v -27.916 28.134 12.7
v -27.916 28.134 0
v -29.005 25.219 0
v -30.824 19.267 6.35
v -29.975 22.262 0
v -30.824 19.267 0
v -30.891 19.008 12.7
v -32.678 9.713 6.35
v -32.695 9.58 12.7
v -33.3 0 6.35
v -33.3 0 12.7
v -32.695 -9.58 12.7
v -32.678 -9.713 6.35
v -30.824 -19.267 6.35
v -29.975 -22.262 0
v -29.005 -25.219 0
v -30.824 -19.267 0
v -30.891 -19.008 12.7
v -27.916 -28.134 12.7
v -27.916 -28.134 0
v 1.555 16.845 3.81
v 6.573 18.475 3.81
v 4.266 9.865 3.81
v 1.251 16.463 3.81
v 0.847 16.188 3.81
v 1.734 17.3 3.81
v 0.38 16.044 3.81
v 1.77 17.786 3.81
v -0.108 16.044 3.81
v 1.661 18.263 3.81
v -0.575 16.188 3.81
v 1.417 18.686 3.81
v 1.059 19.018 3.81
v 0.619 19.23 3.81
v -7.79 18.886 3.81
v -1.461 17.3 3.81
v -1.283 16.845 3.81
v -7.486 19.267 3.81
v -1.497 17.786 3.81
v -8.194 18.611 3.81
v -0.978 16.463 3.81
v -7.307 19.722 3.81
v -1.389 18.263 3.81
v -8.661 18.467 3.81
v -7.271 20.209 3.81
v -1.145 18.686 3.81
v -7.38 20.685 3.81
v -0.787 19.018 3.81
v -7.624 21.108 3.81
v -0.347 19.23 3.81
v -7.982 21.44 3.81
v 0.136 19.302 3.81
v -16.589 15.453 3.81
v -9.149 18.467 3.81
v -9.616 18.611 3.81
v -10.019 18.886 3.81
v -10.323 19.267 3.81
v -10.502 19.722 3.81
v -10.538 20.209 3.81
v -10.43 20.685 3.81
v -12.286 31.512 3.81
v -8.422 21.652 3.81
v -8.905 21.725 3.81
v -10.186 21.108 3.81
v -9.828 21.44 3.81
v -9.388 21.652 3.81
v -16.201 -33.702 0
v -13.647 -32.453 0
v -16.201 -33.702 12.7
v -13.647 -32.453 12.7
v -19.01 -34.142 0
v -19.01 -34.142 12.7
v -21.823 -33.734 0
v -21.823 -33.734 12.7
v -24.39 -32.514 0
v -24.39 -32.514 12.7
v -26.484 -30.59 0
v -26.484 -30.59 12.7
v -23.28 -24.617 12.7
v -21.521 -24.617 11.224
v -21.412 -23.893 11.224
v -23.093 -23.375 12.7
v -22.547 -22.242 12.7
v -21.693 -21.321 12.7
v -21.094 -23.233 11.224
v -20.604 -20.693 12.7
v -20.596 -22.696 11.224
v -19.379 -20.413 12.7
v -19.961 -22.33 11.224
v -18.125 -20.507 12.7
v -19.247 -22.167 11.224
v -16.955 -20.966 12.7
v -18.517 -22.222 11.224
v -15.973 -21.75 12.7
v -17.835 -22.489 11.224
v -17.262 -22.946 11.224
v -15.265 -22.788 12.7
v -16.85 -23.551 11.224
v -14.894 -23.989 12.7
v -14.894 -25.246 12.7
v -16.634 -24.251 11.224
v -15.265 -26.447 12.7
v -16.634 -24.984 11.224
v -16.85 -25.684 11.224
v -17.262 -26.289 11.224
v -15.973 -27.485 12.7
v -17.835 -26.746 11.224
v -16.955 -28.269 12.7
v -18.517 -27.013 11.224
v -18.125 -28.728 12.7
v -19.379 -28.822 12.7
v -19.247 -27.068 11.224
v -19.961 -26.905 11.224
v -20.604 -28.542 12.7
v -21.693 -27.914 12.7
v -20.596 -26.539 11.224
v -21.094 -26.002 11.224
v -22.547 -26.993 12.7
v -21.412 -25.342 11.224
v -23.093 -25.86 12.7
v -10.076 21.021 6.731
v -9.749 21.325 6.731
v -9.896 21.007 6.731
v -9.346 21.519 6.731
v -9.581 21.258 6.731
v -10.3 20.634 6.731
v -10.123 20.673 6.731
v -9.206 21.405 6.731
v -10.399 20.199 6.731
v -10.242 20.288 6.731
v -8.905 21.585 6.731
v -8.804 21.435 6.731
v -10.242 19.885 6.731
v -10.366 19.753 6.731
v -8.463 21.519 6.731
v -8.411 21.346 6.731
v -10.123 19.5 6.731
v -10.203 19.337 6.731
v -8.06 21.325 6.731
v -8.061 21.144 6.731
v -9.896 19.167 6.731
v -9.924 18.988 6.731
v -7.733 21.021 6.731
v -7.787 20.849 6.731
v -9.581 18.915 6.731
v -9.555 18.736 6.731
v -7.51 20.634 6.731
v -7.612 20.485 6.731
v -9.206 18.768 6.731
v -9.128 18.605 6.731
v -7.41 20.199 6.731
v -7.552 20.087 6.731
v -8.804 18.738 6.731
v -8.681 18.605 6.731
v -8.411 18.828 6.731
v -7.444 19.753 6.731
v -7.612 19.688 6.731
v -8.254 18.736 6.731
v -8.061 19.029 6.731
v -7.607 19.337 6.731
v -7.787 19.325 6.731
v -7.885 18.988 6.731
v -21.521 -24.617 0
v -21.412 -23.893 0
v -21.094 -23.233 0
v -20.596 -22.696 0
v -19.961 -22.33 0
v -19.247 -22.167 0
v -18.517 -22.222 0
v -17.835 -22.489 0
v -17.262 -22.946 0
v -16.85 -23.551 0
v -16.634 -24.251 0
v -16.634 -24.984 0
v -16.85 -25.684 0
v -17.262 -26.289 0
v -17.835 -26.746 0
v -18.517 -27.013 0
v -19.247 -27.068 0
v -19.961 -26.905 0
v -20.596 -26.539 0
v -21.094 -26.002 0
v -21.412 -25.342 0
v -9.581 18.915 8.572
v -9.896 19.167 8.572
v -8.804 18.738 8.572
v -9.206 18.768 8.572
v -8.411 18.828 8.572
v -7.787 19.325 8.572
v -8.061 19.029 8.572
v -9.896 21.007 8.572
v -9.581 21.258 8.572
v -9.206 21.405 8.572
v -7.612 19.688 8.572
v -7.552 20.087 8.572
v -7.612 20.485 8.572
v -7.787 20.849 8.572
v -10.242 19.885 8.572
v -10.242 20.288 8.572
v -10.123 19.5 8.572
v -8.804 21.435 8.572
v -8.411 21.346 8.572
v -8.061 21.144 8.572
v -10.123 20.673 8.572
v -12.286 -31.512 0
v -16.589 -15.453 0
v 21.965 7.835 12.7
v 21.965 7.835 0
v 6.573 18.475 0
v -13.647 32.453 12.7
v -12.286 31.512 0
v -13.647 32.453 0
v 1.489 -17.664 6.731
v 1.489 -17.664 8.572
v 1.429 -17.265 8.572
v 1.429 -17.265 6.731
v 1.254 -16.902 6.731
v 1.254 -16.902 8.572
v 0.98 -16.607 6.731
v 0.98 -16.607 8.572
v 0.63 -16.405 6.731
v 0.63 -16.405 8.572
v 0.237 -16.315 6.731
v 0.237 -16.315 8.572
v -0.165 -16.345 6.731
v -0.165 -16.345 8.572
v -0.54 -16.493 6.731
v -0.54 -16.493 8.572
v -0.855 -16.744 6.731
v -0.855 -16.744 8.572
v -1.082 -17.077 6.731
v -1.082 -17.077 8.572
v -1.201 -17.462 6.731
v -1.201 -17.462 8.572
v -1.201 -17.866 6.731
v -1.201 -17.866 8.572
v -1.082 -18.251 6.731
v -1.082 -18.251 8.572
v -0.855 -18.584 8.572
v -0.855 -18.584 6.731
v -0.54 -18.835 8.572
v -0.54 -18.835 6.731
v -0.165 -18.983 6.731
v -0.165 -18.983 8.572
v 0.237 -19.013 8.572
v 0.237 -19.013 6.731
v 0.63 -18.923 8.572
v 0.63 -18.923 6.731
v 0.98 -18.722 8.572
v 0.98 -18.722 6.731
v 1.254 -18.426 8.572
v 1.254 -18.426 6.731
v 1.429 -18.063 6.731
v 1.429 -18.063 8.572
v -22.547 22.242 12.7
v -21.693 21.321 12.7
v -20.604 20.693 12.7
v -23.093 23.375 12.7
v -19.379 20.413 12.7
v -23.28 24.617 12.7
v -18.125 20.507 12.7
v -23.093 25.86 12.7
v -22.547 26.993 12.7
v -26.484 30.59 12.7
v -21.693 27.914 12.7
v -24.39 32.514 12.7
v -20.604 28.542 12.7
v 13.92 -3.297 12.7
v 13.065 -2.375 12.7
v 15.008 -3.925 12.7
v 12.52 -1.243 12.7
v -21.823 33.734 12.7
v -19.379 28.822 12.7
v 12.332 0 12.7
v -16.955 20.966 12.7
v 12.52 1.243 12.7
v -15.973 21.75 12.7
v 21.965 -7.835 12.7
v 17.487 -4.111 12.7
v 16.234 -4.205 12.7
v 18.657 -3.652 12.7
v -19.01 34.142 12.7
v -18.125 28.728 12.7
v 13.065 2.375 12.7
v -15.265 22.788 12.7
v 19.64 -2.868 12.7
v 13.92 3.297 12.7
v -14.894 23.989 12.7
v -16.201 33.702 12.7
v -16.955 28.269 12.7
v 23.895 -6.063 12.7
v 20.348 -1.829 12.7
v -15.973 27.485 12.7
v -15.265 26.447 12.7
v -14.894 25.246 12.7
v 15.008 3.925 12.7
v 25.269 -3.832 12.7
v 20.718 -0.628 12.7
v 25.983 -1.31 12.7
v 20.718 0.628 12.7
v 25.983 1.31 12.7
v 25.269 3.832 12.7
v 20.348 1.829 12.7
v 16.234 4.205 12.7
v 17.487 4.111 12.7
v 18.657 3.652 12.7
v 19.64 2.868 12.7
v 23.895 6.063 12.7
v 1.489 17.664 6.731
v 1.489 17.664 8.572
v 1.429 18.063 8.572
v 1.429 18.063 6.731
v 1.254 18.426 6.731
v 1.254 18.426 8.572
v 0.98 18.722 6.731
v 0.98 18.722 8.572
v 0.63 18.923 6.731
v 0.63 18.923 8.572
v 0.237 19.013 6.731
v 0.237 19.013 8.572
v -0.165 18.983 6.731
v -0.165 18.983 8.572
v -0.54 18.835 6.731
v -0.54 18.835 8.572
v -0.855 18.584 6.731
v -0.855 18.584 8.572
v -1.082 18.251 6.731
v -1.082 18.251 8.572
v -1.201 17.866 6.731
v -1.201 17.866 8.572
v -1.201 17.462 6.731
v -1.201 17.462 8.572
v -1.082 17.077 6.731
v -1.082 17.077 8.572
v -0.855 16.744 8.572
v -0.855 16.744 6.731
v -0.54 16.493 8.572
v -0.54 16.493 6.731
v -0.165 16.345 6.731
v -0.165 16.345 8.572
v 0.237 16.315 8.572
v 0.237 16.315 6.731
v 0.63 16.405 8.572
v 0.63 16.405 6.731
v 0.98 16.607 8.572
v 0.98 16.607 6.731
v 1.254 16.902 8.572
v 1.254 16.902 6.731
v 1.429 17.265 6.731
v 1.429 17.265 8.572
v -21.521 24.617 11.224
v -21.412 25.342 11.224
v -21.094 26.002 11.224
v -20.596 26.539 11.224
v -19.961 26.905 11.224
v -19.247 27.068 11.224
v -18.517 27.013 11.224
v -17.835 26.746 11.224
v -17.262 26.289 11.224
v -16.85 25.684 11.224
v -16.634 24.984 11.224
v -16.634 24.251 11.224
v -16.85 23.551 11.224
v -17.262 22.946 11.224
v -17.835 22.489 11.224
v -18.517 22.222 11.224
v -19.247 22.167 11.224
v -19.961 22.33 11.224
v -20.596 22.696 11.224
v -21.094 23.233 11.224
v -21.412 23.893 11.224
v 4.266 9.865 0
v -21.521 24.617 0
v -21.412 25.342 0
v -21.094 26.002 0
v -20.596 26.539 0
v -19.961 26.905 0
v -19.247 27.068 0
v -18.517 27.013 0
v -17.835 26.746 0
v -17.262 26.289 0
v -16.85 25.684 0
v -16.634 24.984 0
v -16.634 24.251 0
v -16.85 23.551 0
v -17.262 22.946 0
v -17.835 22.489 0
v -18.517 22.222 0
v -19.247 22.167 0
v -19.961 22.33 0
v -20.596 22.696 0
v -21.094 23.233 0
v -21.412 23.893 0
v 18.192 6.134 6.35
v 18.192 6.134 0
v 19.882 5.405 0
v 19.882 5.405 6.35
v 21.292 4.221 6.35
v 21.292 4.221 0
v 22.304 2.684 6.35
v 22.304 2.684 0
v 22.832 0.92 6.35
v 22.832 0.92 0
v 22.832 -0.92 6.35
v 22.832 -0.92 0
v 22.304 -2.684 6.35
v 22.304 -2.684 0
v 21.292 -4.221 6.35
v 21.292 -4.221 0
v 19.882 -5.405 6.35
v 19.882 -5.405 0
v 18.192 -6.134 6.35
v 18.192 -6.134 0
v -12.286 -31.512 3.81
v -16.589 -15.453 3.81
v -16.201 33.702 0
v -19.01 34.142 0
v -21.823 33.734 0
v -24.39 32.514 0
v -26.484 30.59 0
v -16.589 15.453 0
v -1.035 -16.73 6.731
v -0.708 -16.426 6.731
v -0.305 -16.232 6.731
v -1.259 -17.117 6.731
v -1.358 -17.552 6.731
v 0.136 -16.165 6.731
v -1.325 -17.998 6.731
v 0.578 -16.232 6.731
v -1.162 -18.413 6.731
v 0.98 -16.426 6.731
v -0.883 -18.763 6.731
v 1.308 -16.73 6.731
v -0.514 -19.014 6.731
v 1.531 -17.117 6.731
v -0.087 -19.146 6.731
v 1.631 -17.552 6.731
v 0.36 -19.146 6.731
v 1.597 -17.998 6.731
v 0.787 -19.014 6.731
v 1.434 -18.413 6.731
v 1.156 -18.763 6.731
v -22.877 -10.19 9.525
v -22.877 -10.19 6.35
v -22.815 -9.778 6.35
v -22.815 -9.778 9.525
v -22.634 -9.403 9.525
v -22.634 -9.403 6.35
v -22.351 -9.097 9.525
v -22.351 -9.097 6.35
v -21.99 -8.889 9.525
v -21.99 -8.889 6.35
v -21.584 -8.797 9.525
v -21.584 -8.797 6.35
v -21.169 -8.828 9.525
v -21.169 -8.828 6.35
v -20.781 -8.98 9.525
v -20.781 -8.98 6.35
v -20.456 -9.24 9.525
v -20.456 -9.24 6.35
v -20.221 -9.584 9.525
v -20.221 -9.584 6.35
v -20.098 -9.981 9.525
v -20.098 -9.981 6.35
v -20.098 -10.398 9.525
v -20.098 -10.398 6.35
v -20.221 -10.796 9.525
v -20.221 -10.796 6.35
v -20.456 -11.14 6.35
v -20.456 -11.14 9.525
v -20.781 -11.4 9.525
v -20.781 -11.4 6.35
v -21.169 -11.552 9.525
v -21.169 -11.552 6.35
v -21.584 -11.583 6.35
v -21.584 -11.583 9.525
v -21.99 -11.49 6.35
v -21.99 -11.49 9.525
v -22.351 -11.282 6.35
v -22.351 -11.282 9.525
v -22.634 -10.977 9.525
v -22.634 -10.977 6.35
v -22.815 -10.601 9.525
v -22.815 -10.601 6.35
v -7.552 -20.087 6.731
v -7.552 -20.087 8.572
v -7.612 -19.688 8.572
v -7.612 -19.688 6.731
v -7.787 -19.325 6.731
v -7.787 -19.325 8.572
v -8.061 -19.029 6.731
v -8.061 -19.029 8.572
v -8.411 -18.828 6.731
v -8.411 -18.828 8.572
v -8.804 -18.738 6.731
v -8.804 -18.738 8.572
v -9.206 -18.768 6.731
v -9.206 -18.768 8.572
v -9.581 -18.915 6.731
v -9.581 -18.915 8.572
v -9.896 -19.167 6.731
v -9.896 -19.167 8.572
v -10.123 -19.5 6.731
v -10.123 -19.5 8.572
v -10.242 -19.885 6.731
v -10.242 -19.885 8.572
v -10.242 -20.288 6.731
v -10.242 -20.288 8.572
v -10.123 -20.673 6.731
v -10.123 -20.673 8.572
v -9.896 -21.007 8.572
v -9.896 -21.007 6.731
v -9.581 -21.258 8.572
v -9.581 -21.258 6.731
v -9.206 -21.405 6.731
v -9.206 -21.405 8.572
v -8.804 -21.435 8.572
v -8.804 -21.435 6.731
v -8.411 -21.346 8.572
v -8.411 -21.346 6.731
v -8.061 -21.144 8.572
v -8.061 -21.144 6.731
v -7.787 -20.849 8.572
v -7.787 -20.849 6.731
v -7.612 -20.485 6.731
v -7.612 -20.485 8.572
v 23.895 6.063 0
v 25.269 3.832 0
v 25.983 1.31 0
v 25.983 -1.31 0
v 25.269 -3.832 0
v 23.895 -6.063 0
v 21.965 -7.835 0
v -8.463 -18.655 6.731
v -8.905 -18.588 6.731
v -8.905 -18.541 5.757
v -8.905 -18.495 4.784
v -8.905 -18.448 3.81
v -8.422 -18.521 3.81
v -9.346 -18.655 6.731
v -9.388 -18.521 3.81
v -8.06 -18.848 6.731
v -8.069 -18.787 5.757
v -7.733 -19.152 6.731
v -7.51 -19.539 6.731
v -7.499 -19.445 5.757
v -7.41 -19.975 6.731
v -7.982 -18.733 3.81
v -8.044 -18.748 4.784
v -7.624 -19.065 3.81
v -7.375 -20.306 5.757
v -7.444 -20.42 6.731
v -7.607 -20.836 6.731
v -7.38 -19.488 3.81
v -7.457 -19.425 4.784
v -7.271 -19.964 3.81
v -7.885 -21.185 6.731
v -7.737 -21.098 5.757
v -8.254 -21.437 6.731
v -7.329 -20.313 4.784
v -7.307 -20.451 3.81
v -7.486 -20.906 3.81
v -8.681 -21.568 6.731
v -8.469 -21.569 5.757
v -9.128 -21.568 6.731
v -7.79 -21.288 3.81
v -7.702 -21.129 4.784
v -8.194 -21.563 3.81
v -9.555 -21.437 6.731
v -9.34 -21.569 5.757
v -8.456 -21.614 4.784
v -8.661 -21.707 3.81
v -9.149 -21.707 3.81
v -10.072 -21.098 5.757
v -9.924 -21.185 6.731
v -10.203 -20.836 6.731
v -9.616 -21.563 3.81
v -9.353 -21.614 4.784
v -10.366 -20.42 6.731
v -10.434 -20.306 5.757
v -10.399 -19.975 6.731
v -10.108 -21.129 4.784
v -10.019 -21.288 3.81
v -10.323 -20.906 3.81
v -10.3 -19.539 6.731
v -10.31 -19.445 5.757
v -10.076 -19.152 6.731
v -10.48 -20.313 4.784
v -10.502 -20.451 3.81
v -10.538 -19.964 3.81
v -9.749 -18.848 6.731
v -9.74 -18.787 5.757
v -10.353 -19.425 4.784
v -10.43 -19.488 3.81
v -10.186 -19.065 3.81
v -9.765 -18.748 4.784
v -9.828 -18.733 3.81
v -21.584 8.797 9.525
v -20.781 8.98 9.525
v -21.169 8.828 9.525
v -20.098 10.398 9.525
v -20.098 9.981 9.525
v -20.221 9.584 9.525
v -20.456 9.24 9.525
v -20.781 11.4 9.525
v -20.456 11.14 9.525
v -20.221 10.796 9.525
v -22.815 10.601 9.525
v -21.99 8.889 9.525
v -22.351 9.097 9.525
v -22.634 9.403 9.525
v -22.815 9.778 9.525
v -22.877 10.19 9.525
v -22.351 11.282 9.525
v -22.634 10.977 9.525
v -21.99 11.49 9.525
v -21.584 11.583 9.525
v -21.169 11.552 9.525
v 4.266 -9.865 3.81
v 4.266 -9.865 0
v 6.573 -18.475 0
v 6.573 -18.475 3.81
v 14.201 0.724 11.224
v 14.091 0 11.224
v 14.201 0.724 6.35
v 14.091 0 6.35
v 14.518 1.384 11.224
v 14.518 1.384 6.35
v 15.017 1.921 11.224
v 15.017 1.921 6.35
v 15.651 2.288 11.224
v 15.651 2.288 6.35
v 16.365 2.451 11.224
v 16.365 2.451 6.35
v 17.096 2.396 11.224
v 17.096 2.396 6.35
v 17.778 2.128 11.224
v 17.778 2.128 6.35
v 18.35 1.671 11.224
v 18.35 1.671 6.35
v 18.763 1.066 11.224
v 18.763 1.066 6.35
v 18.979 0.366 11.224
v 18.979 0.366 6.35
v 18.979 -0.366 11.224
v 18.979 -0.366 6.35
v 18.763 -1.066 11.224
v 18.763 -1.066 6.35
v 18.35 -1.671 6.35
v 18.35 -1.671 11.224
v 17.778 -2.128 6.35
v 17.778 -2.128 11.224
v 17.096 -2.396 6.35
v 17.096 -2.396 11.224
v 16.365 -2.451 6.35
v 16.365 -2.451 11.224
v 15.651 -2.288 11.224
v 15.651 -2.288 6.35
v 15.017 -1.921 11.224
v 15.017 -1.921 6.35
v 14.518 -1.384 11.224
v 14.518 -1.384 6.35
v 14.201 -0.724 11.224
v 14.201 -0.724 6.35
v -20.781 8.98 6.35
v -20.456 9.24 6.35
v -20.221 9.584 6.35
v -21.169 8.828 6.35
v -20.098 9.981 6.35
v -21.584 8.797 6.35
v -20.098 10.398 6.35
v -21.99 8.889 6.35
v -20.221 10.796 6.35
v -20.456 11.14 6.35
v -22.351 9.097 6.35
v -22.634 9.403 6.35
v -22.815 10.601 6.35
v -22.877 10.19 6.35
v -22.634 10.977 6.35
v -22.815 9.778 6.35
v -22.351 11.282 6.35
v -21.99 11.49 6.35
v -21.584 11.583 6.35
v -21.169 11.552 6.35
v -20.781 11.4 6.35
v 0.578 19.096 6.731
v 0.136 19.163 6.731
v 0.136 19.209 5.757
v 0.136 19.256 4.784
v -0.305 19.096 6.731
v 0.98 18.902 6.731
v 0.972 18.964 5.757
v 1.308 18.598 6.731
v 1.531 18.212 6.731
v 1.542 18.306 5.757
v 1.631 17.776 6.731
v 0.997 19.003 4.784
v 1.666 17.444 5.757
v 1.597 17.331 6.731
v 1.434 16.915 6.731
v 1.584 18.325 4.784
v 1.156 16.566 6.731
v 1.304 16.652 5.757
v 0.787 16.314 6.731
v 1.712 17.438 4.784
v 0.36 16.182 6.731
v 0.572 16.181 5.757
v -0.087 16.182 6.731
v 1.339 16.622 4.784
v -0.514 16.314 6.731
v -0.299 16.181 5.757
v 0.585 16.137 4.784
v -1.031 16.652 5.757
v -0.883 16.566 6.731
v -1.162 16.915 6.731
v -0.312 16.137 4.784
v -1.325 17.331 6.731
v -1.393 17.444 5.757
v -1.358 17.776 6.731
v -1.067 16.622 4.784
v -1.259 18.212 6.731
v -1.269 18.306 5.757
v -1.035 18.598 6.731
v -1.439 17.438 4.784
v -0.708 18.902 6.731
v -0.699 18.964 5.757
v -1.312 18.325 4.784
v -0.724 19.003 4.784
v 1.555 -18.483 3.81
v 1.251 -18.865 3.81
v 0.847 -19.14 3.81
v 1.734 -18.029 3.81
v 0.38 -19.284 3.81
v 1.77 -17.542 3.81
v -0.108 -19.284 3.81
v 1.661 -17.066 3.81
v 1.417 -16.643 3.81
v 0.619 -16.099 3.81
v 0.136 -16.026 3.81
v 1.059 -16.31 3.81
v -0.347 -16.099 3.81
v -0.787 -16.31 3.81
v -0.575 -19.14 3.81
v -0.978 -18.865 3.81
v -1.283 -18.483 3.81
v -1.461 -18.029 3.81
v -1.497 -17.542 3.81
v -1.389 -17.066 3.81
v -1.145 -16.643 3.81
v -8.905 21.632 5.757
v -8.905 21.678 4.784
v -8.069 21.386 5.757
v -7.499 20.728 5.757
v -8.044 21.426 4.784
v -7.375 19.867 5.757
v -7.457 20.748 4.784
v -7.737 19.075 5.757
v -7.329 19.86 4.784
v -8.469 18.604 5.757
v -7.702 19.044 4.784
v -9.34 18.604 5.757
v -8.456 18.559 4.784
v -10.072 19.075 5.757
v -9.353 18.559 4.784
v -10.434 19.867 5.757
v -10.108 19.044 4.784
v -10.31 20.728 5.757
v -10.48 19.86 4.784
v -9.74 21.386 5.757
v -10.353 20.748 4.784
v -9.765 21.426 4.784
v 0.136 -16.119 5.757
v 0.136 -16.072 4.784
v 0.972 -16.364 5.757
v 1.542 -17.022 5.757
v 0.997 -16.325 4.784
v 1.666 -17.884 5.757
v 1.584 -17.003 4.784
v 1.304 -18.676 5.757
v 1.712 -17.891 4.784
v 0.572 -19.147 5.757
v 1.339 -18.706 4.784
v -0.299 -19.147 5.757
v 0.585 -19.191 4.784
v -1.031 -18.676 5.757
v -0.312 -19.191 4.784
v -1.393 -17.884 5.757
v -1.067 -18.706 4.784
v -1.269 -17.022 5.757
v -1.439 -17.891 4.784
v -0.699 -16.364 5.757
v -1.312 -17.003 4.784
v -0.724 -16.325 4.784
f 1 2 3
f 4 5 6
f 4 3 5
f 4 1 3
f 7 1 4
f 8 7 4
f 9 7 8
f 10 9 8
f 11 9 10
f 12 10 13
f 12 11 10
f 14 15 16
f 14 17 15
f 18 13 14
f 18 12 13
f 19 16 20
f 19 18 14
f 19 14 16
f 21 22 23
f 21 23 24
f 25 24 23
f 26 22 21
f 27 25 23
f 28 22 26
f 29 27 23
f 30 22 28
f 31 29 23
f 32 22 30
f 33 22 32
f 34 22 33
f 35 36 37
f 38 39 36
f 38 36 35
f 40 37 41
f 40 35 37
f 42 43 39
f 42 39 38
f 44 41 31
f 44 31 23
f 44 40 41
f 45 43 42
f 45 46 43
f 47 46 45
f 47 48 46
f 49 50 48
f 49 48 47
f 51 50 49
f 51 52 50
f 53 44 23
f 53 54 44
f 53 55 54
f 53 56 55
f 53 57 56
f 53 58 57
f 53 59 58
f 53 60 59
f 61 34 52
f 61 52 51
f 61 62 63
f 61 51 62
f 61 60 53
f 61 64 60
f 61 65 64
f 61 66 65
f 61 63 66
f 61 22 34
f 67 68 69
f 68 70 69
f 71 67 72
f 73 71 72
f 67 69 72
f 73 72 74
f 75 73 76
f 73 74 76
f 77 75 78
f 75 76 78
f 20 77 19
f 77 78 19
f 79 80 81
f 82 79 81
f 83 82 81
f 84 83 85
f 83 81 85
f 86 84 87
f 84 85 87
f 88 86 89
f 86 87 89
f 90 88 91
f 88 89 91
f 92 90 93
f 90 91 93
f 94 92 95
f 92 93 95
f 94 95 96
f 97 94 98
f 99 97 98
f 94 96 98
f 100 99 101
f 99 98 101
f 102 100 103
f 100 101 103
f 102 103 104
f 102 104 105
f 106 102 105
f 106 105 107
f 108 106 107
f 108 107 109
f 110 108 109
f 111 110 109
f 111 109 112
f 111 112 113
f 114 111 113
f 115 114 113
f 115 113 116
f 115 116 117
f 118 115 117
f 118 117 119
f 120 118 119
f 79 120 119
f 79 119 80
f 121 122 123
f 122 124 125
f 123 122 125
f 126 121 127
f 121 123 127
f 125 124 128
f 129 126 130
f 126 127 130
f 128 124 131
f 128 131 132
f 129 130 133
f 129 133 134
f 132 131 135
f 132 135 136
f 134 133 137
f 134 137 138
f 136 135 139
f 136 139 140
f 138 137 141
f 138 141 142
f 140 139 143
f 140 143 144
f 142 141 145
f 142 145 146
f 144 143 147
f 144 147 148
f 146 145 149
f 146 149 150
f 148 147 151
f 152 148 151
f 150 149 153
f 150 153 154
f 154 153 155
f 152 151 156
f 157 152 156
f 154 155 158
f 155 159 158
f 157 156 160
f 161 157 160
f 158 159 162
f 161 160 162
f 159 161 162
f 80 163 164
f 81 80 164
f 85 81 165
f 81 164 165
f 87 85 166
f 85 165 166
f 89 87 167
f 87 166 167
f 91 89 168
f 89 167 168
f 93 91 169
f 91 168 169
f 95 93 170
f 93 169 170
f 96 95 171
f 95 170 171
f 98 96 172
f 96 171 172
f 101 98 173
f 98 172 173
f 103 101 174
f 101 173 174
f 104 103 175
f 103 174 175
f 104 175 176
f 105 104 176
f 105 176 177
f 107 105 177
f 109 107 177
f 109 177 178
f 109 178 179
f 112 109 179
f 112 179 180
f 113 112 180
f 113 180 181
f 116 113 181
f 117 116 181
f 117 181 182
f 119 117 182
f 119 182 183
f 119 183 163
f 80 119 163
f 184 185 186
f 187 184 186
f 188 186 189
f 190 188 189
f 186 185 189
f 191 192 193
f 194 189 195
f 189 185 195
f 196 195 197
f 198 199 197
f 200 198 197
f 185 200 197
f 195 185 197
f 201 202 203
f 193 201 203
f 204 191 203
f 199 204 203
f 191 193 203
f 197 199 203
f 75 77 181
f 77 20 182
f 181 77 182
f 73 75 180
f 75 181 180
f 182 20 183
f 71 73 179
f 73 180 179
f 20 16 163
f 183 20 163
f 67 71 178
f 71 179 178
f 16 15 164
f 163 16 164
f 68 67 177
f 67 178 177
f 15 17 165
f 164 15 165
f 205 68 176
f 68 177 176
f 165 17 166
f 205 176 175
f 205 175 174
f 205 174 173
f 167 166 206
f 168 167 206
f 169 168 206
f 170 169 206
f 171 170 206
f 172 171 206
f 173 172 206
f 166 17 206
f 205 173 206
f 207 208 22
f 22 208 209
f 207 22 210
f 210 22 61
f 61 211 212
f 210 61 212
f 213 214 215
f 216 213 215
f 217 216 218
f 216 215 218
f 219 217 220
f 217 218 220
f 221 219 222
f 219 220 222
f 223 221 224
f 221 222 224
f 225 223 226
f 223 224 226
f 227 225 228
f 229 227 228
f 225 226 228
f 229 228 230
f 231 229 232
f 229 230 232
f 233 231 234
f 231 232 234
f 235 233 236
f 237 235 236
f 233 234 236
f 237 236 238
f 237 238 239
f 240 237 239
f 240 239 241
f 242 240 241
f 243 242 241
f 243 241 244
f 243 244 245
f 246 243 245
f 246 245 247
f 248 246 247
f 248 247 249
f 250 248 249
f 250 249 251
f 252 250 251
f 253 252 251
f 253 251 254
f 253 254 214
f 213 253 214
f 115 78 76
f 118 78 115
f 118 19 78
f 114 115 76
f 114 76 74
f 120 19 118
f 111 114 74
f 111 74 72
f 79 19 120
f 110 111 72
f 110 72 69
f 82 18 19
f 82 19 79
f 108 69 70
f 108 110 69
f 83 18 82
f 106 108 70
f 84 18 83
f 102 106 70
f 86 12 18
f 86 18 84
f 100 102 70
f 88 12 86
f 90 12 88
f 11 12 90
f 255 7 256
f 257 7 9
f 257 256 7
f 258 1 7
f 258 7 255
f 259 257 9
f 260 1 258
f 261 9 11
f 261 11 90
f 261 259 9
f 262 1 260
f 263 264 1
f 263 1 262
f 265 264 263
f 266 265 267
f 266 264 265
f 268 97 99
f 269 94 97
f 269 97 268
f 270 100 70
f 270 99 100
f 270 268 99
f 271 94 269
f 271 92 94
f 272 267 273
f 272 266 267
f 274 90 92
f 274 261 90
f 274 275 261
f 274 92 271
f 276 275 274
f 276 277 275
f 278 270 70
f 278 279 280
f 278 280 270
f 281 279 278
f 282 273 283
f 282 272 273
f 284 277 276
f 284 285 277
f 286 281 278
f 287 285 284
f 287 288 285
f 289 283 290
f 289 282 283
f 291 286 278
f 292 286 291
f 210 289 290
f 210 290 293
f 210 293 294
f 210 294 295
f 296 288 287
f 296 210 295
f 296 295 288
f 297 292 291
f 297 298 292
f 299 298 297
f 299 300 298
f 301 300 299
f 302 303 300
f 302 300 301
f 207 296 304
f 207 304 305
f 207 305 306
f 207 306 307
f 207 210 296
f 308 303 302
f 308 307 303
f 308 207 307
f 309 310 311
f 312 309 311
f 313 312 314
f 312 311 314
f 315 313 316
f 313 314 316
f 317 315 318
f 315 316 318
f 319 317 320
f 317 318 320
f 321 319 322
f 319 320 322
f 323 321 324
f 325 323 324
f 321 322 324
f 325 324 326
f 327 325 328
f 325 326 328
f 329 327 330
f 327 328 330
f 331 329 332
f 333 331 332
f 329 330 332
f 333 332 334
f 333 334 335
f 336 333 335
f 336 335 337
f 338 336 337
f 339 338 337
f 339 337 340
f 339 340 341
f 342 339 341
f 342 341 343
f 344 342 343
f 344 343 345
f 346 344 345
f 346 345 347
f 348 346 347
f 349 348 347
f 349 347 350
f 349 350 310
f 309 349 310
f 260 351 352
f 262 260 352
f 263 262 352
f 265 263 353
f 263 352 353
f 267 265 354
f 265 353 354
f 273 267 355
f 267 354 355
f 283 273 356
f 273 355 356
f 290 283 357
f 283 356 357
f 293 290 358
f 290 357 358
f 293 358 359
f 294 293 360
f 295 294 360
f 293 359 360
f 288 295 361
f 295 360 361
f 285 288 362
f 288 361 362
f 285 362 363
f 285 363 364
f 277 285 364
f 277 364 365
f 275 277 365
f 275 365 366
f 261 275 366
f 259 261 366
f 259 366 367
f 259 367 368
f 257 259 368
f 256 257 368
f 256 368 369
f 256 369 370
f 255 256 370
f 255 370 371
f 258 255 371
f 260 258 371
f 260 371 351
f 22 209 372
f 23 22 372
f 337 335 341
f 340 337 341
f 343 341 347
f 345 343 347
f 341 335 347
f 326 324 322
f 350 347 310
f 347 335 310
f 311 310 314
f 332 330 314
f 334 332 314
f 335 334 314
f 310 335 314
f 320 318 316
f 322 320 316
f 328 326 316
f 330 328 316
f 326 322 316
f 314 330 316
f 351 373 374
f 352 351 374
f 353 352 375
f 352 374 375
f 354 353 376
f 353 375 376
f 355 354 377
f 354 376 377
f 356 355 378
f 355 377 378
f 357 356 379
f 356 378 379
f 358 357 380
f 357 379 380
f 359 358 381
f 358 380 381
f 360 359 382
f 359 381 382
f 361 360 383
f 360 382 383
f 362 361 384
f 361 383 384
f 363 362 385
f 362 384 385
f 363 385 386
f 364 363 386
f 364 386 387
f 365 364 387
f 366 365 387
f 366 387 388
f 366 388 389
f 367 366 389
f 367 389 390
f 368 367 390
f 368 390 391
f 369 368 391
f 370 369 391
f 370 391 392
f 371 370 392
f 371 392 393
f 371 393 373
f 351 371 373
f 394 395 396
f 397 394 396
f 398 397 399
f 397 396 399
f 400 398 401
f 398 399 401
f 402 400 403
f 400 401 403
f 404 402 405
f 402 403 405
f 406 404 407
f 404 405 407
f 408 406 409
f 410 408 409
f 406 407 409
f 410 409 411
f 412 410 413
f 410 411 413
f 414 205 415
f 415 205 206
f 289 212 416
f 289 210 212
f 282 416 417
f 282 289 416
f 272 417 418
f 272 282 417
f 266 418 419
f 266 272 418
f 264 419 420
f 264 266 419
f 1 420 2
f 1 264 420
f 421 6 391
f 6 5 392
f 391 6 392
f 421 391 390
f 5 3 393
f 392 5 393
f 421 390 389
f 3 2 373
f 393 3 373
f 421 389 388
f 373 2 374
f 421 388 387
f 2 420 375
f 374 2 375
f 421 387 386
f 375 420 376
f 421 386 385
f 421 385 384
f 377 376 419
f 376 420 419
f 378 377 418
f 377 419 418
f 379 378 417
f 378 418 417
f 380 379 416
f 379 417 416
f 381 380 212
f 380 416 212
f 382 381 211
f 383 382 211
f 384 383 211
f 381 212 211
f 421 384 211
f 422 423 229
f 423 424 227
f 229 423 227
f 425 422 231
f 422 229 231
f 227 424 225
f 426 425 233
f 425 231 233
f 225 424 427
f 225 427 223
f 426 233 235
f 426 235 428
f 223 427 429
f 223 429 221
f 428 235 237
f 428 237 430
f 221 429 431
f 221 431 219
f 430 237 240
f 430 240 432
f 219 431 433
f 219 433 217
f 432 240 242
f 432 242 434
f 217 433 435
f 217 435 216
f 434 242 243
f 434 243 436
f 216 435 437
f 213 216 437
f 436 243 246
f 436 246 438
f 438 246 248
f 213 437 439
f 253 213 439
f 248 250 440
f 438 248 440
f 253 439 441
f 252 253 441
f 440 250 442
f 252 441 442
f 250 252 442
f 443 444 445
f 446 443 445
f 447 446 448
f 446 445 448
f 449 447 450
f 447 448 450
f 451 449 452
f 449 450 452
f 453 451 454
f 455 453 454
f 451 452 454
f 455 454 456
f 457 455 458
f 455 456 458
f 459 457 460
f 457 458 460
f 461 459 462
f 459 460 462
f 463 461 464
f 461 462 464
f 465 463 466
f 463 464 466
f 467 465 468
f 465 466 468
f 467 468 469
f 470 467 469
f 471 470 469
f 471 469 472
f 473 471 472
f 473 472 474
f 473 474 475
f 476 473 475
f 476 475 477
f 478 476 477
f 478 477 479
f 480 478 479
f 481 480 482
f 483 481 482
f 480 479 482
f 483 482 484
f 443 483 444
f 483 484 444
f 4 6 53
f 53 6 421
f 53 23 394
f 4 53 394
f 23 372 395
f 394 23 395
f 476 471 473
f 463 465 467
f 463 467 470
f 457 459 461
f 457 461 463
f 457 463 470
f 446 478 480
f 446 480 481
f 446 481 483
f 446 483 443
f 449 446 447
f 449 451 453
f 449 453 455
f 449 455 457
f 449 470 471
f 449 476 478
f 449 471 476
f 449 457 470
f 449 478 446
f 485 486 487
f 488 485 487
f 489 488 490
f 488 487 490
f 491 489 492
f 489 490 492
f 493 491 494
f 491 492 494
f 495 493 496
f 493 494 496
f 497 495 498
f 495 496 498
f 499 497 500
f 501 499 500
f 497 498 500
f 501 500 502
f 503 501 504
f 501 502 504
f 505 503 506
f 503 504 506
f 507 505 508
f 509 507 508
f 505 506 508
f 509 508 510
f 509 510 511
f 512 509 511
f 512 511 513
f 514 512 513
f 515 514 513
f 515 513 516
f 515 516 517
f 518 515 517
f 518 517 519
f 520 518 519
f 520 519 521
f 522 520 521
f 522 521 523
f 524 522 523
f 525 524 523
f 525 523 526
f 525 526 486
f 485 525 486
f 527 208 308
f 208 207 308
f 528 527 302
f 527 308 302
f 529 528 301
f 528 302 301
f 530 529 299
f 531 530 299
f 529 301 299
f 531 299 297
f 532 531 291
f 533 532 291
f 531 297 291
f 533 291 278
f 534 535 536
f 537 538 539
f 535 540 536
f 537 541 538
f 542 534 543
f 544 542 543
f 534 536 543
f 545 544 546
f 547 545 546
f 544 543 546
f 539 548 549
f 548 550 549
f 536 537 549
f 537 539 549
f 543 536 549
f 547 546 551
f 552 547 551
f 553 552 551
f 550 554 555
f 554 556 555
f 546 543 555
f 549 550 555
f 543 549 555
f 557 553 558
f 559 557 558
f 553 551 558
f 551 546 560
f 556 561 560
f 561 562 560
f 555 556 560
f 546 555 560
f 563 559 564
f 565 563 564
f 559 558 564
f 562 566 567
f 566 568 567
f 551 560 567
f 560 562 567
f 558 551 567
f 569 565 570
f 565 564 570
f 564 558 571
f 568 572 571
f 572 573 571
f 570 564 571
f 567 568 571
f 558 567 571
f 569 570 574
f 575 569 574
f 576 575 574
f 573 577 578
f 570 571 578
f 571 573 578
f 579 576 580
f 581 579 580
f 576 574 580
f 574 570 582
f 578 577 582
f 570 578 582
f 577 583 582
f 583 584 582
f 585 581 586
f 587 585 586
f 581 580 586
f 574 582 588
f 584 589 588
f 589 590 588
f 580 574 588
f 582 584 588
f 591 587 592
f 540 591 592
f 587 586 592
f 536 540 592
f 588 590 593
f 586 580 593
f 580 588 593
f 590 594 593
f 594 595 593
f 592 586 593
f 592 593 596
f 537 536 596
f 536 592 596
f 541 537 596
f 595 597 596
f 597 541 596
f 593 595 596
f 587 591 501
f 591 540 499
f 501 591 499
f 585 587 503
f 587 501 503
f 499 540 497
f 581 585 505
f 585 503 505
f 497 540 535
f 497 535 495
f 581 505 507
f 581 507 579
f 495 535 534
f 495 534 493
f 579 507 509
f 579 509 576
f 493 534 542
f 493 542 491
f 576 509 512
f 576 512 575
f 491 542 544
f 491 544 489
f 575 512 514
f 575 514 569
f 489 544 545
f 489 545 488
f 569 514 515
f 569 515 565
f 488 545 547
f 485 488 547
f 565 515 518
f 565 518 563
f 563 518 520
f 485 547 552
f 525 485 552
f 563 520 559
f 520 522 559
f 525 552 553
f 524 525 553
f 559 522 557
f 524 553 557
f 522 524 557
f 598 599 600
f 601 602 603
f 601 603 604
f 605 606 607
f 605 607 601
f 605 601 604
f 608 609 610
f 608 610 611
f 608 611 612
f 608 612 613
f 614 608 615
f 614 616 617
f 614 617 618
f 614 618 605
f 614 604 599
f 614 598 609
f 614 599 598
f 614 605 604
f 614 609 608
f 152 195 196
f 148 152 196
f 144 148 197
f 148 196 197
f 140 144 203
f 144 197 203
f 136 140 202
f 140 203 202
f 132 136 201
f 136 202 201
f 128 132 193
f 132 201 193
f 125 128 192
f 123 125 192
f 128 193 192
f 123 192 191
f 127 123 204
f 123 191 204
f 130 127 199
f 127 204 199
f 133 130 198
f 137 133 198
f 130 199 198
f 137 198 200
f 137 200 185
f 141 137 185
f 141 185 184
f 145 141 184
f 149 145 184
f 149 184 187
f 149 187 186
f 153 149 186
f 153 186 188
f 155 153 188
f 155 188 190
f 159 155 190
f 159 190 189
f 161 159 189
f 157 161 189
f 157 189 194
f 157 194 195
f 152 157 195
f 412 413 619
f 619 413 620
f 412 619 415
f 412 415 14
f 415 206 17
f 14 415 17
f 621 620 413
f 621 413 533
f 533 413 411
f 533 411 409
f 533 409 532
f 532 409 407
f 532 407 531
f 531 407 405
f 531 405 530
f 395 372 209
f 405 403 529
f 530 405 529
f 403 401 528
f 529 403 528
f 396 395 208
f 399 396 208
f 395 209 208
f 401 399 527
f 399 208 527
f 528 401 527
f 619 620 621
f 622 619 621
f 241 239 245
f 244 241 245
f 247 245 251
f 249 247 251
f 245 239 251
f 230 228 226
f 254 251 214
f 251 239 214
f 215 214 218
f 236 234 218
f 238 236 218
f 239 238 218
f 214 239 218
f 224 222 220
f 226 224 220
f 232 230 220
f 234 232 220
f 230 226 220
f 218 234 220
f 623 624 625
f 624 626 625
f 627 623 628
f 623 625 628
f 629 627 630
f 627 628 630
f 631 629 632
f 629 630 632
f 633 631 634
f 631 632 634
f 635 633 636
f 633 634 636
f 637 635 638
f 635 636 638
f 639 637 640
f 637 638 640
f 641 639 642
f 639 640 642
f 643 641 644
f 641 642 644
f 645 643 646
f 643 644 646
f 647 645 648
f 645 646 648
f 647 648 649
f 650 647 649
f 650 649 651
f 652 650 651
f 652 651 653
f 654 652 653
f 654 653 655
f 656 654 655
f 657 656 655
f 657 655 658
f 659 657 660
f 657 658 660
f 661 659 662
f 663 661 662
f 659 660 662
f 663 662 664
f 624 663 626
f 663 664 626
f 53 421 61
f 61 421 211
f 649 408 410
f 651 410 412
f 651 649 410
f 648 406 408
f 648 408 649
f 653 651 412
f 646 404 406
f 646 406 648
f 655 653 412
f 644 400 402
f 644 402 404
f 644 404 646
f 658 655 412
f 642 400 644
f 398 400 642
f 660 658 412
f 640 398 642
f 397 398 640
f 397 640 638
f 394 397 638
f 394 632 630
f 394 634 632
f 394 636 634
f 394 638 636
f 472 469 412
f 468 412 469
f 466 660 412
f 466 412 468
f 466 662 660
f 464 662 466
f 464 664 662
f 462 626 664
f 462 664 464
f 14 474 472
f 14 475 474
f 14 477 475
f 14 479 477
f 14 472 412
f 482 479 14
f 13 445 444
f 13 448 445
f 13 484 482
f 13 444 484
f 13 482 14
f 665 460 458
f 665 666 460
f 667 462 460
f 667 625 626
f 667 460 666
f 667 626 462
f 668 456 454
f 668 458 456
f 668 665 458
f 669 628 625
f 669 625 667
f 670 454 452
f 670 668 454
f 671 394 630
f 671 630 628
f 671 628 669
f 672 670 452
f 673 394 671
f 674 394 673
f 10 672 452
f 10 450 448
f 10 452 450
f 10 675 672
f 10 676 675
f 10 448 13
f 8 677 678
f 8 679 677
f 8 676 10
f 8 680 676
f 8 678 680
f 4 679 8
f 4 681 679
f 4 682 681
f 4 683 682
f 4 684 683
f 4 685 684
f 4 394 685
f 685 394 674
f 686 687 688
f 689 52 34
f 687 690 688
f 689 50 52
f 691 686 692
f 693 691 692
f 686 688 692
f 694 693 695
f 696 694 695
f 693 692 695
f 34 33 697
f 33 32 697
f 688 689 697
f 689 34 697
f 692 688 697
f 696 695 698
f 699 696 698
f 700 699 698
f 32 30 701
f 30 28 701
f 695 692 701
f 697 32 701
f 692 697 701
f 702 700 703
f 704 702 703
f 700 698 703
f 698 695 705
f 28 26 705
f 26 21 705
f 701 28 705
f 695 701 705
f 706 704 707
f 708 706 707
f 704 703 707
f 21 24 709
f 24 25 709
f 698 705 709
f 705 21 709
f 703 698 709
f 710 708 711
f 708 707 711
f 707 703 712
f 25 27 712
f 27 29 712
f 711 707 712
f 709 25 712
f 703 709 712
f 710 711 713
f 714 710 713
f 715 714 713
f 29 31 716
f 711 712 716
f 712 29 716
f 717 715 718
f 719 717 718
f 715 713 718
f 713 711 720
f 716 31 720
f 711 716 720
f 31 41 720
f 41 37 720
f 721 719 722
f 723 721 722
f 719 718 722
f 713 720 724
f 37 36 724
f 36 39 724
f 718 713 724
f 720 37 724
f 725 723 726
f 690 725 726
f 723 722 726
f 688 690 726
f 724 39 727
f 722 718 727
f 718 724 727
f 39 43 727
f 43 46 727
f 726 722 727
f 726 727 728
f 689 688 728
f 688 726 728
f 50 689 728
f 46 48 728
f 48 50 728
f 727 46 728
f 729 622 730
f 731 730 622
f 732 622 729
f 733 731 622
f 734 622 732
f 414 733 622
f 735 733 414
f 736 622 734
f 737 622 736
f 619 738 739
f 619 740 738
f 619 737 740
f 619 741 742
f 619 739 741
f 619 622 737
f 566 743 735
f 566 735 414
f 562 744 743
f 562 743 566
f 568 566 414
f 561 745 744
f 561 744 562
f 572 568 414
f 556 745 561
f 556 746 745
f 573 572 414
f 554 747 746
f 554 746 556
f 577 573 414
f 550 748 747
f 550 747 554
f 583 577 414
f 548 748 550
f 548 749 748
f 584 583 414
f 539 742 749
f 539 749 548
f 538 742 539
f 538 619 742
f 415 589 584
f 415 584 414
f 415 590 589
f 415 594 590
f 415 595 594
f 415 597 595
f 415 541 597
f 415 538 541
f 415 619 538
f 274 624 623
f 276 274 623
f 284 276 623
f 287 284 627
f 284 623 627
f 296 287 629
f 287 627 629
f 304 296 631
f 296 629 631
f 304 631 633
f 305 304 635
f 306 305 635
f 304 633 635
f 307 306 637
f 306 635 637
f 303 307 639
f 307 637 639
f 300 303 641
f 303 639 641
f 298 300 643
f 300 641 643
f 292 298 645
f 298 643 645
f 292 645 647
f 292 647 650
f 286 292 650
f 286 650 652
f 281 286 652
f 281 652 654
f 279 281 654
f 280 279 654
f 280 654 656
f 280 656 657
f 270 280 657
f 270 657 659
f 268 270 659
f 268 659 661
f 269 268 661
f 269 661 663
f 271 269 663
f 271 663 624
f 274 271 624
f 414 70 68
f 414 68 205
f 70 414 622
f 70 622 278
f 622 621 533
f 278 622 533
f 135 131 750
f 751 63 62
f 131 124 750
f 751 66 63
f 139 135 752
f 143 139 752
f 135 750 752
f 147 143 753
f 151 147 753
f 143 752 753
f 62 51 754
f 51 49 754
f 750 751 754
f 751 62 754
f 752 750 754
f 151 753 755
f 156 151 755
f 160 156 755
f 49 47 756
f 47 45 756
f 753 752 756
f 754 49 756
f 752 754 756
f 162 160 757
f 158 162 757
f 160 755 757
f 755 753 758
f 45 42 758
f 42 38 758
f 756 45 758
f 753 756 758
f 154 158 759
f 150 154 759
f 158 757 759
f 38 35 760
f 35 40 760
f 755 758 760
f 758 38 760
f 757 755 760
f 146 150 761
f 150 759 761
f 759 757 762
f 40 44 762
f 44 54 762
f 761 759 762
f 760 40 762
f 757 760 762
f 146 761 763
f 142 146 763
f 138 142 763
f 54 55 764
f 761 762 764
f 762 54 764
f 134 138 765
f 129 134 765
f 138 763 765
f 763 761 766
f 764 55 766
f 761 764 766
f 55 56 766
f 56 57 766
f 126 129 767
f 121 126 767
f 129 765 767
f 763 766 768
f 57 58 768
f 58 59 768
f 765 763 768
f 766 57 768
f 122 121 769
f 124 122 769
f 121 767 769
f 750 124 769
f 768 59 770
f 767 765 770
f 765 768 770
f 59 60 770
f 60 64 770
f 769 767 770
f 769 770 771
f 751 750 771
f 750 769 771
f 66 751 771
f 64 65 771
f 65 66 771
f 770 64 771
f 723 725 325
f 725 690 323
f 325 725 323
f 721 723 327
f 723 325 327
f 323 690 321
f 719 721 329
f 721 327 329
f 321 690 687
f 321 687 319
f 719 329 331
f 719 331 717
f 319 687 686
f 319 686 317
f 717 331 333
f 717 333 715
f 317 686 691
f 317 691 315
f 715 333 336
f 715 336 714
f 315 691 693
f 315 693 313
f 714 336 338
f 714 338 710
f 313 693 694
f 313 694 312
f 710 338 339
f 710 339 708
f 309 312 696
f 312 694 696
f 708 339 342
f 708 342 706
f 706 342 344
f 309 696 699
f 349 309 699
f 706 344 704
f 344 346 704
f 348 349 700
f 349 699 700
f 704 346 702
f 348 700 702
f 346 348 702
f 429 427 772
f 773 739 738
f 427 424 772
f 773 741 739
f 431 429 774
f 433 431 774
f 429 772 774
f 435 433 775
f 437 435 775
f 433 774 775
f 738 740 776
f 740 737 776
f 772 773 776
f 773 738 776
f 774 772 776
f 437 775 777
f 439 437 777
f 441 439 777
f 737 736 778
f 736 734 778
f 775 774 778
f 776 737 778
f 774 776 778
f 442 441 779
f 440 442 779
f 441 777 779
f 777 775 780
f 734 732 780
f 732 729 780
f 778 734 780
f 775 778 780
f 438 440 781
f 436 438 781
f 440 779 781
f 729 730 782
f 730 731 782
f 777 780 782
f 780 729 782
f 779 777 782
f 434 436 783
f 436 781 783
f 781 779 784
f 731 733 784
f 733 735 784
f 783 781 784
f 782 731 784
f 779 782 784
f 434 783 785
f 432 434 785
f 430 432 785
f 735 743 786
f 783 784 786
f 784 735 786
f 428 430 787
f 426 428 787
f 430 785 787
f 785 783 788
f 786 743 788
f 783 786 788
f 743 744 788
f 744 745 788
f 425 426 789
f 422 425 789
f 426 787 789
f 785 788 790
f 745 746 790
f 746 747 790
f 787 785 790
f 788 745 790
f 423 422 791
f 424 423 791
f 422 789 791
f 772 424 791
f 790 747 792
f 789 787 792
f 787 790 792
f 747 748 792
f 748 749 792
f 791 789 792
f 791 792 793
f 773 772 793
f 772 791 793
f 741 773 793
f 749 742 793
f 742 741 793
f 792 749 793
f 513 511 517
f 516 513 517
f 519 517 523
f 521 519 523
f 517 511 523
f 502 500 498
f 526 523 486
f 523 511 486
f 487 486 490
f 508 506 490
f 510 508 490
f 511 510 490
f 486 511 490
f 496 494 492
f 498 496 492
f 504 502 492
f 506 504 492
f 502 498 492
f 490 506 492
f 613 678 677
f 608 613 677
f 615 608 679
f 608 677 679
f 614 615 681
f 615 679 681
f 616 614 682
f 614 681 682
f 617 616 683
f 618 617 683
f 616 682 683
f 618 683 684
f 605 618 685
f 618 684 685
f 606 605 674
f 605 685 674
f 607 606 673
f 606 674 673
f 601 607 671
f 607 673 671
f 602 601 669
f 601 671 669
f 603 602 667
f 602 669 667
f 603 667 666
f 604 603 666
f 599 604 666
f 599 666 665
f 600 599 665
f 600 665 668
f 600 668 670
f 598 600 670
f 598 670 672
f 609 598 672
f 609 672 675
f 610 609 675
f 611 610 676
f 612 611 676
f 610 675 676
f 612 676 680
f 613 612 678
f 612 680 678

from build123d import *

# Parameters (mm, degrees)
BOSS_EXTRUDE1_DEPTH                               = 12.7
SKETCH2_R                                         = 101.6
SKETCH2_R_2                                       = 76.2
CUT_EXTRUDE1_DEPTH                                = 13.7
FILLET1_R                                         = 9.525
CSK_FOR_8_FLAT_HEAD_MACHINE_SCREW_100_D           = 4.9149
CSK_FOR_8_FLAT_HEAD_MACHINE_SCREW_100_DEPTH       = 12.7
CSK_FOR_8_FLAT_HEAD_MACHINE_SCREW_100_CSINK_D     = 8.4328
CSK_FOR_8_FLAT_HEAD_MACHINE_SCREW_100_CSINK_ANGLE = 100
CUT_EXTRUDE2_DEPTH                                = 6.35
CUT_EXTRUDE3_DEPTH                                = 3.81
SKETCH7_R                                         = 1.397
CUT_EXTRUDE4_DEPTH                                = 3.175
HOLE1_AT_2_COUNT                                  = 2
HOLE1_AT_2_PITCH                                  = 9.3599
HOLE1_AT_3_COUNT                                  = 2
HOLE1_AT_3_PITCH                                  = 38.818175673
HOLE1_AT_4_COUNT                                  = 2
HOLE1_AT_4_PITCH                                  = 40.17317123
F_2_CLEARANCE_HOLE1_D                             = 2.7051
F_2_CLEARANCE_HOLE1_DEPTH                         = 4.7625


with BuildPart() as part:
    # Sketch1 → Boss-Extrude1 (new body)
    with BuildSketch(Plane.XY):
        Polygon((33.299680929, 0), (-33.299680929, 46.0375), (-33.299680929, -46.0375), align=None)
    extrude(amount=BOSS_EXTRUDE1_DEPTH)

    # Sketch2 → Cut-Extrude1 (cut, through all)
    with BuildSketch(Plane.XY.offset(12.7)):
        with Locations((42.900319071, 0)):
            Circle(SKETCH2_R)
        with Locations((42.900319071, 0)):
            Circle(SKETCH2_R_2, mode=Mode.SUBTRACT)
    extrude(amount=-CUT_EXTRUDE1_DEPTH, mode=Mode.SUBTRACT)

    # Fillet1
    fillet1_edges = [part.edges().sort_by_distance(p)[0] for p in [
        (-22.72460624, -38.727369881, 6.35),
        (-22.72460624, 38.727369881, 6.35),
        (33.299680929, 0, 6.35),
    ]]
    fillet(fillet1_edges, radius=FILLET1_R)

    # CSK for #8 Flat Head Machine Screw (100)1
    with Locations(Plane.XY.offset(12.7)):
        with Locations((-19.063658953, -24.617494846), (-19.063658953, 24.617494846), (16.54881886, 0)):
            CounterSinkHole(CSK_FOR_8_FLAT_HEAD_MACHINE_SCREW_100_D / 2, CSK_FOR_8_FLAT_HEAD_MACHINE_SCREW_100_CSINK_D / 2, depth=CSK_FOR_8_FLAT_HEAD_MACHINE_SCREW_100_DEPTH, counter_sink_angle=CSK_FOR_8_FLAT_HEAD_MACHINE_SCREW_100_CSINK_ANGLE)

    # Sketch5 → Cut-Extrude2 (cut)
    with BuildSketch(Plane(origin=(0, 0, 0), x_dir=(-1, 0, 0), z_dir=(0, 0, -1))):
        with BuildLine():
            Line((30.823542048, 19.267389595), (-18.192319797, 6.133628997))
            ThreePointArc((-18.192319797, 6.133628997), (-22.89881886, 0), (-18.192319797, -6.133628997))
            Line((-18.192319797, -6.133628997), (30.823542048, -19.267389595))
            ThreePointArc((30.823542048, -19.267389595), (33.299680929, 0), (30.823542048, 19.267389595))
        make_face()
    extrude(amount=-CUT_EXTRUDE2_DEPTH, mode=Mode.SUBTRACT)

    # Sketch6 → Cut-Extrude3 (cut)
    with BuildSketch(Plane(origin=(0, 0, 0), x_dir=(-1, 0, 0), z_dir=(0, 0, -1))):
        Polygon((16.588726313, -15.453182214), (-4.265612277, -9.86527903), (-8.867414899, -27.039440222), (11.986923691, -32.627343405), align=None)
        Polygon((11.986923691, 32.627343405), (-8.867414899, 27.039440222), (-4.265612277, 9.86527903), (16.588726313, 15.453182214), align=None)
    extrude(amount=-CUT_EXTRUDE3_DEPTH, mode=Mode.SUBTRACT)

    # Sketch7 → Cut-Extrude4 (cut)
    with BuildSketch(Plane(origin=(0, 0, 6.35), x_dir=(-1, 0, 0), z_dir=(0, 0, -1))):
        with Locations((21.479680921, -10.189705806)):
            Circle(SKETCH7_R)
        with Locations((21.479680921, 10.189705806)):
            Circle(SKETCH7_R)
    extrude(amount=-CUT_EXTRUDE4_DEPTH, mode=Mode.SUBTRACT)

    # Sketch9 → Hole1 (revolve, cut)
    with BuildSketch(Plane(origin=(-8.904685942, -20.086585615, 3.81), x_dir=(0, 1, 0), z_dir=(1, 0, 0))):
        Polygon((0, 0), (0, 2.921), (1.4986, 2.921), (1.6383, 0), align=None)
    hole1 = revolve(axis=Axis((-8.904685942, -20.086585615, 113.81), (0, 0, -1)), mode=Mode.SUBTRACT)

    # Hole1 at 2: Hole1 ×2
    with Locations(*[Vector(0.965925826, 0.258819045, 0) * (i * HOLE1_AT_2_PITCH) for i in range(1, HOLE1_AT_2_COUNT)]):
        add(hole1, mode=Mode.SUBTRACT)

    # Hole1 at 3: Hole1 ×2
    with Locations(*[Vector(0.232905565, 0.972499356, 0) * (i * HOLE1_AT_3_PITCH) for i in range(1, HOLE1_AT_3_COUNT)]):
        add(hole1, mode=Mode.SUBTRACT)

    # Hole1 at 4: Hole1 ×2
    with Locations(*[(0, i * HOLE1_AT_4_PITCH, 0) for i in range(1, HOLE1_AT_4_COUNT)]):
        add(hole1, mode=Mode.SUBTRACT)

    # #2 Clearance Hole1
    with Locations(Plane(origin=(0, 0, 3.81), x_dir=(-1, 0, 0), z_dir=(0, 0, -1))):
        with Locations((8.904685942, -20.086585615), (-0.136283199, -17.664065235), (-0.136283199, 17.664065235), (8.904685942, 20.086585615)):
            Hole(F_2_CLEARANCE_HOLE1_D / 2, depth=F_2_CLEARANCE_HOLE1_DEPTH)


solid = part.part
